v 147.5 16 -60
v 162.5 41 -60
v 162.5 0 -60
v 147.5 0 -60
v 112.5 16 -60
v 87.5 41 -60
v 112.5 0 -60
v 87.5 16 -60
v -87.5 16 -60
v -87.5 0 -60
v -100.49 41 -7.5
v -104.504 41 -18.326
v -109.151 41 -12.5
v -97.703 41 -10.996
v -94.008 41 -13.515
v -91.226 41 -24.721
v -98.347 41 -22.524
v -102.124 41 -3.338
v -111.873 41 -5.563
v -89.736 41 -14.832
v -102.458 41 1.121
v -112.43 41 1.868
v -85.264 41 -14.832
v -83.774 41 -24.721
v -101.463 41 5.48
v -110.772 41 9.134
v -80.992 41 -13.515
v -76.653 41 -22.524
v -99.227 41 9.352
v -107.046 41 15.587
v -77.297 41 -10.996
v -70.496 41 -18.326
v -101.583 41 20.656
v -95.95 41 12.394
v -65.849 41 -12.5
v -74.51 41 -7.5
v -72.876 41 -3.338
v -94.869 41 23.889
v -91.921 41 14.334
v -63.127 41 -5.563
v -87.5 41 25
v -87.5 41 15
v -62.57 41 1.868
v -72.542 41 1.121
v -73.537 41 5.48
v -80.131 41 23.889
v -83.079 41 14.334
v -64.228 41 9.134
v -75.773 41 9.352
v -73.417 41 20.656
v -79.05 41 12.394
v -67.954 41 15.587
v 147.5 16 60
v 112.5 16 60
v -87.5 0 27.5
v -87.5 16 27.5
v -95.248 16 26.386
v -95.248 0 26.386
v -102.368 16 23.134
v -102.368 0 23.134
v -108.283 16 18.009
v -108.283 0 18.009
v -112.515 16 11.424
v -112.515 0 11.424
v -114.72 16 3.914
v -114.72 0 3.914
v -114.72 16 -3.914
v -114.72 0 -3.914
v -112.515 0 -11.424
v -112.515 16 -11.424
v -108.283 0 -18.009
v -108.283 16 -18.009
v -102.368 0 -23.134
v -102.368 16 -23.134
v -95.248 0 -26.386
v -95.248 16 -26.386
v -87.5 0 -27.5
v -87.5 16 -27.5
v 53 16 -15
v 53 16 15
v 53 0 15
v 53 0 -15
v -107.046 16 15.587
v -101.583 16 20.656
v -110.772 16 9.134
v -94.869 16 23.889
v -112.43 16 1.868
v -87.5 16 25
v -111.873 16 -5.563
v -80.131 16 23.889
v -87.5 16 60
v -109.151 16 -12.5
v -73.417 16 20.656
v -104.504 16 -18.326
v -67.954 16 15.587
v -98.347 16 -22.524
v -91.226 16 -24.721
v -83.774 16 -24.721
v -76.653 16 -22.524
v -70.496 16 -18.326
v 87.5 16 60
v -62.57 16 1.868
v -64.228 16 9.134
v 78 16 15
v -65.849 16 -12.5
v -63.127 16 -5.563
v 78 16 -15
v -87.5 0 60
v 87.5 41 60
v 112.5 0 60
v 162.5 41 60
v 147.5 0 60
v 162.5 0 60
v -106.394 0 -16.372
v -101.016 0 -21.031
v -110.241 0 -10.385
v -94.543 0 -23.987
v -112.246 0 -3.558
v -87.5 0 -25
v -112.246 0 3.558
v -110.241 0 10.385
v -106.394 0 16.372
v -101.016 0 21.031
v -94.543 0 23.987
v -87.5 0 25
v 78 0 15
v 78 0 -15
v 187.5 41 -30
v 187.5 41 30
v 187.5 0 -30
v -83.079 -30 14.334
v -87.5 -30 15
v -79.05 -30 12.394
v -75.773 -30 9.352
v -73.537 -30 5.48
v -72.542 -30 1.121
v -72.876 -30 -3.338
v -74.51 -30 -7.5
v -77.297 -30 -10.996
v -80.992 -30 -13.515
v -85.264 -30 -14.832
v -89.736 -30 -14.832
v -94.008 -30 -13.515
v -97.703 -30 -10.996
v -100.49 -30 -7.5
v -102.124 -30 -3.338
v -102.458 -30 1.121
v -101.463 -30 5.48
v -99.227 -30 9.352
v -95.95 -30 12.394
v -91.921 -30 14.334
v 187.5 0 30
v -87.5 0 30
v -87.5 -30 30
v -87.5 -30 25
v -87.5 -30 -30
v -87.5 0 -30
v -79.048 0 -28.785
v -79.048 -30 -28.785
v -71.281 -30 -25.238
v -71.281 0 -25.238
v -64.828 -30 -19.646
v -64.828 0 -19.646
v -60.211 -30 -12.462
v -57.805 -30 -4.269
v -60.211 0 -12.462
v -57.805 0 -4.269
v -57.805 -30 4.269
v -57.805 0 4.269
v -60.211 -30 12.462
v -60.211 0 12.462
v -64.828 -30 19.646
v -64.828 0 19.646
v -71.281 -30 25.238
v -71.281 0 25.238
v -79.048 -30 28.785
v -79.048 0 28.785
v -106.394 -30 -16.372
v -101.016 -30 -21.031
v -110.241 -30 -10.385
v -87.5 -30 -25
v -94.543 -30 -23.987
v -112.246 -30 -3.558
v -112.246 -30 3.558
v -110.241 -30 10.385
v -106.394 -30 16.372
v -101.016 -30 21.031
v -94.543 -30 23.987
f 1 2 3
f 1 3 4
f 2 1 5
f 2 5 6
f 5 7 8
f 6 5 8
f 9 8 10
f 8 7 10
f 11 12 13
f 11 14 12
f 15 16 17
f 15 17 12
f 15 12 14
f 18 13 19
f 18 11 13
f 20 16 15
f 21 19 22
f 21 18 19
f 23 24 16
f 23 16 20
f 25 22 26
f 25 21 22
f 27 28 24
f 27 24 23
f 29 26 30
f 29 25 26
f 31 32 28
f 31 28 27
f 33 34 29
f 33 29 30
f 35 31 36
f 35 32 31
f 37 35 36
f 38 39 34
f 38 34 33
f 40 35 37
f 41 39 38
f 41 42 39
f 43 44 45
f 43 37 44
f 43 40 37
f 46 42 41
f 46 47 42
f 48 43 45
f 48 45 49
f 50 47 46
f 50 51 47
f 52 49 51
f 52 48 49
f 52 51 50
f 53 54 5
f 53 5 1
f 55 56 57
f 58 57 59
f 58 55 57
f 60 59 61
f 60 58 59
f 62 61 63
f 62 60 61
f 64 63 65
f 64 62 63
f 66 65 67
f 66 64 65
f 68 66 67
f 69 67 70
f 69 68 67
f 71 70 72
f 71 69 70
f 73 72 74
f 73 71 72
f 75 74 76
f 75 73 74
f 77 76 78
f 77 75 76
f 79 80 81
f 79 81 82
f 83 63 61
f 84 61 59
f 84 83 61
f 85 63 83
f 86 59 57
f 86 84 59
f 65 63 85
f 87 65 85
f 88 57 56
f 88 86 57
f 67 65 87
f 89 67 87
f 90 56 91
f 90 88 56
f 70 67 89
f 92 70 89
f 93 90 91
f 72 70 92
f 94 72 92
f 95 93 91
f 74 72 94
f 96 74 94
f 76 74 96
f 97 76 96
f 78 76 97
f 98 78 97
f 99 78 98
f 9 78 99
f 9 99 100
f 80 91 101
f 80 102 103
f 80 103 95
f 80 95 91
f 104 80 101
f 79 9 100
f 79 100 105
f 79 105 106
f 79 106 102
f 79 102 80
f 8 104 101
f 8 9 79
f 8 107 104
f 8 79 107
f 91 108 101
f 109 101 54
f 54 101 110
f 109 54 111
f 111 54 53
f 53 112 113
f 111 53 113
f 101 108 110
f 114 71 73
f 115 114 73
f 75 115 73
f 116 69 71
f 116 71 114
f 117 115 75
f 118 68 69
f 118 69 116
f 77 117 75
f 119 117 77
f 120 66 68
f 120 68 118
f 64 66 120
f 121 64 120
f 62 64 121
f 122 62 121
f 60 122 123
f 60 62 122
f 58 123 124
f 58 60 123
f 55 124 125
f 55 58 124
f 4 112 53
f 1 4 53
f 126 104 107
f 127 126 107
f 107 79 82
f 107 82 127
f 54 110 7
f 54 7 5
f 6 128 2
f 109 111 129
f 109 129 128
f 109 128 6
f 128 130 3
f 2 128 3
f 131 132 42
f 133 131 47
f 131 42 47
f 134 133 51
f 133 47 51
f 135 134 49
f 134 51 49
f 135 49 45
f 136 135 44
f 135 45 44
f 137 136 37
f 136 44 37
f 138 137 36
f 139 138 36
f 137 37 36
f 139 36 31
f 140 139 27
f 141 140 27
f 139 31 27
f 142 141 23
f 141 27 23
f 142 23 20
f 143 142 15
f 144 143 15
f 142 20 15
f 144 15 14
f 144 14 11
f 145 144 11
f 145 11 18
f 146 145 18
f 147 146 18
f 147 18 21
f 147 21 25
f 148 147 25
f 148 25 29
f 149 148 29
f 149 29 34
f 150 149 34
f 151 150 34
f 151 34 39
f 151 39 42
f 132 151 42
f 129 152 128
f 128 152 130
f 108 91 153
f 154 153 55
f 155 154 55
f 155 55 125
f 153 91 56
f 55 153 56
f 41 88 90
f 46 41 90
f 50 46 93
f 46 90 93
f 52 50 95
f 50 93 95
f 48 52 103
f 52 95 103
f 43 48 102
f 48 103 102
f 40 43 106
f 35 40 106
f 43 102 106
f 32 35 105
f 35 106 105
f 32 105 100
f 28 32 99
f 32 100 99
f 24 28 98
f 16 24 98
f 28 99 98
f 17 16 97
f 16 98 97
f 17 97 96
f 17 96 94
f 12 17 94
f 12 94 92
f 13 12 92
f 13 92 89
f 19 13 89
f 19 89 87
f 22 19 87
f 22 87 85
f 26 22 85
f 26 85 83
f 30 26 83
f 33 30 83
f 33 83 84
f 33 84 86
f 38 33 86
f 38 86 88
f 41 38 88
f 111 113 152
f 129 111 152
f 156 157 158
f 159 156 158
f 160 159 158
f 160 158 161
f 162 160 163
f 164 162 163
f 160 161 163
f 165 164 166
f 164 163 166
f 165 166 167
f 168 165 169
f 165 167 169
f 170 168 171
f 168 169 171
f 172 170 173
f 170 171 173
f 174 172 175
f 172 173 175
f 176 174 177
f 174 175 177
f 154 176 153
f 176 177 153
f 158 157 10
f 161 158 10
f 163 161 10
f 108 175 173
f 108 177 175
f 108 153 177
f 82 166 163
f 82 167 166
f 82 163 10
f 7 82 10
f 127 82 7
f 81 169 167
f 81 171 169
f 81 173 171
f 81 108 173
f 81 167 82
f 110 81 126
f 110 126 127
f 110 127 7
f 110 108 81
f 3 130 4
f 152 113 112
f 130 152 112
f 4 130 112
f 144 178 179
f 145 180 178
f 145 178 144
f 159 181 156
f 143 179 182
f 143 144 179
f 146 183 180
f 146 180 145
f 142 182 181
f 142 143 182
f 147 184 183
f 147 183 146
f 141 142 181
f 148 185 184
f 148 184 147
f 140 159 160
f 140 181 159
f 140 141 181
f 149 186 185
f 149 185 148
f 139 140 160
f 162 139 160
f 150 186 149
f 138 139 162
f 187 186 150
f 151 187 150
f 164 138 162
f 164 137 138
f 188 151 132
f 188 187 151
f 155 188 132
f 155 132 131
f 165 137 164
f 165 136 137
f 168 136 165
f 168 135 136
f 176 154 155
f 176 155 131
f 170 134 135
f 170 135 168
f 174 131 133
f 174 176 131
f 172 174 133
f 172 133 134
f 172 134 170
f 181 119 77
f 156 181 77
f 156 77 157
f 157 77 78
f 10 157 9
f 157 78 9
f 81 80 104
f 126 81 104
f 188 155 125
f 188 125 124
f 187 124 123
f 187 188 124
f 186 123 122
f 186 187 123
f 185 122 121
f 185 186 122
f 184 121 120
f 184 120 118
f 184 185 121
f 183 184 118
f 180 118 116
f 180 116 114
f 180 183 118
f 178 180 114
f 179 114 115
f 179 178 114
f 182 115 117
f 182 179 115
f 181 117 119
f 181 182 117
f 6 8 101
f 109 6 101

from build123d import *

# Parameters (mm, degrees)
CROQUIS1_W              = 175
CROQUIS1_H              = 120
SALIENTE_EXTRUIR1_DEPTH = 16
SALIENTE_EXTRUIR3_DEPTH = 41
CROQUIS7_W              = 35
CROQUIS7_H              = 16
CORTAR_EXTRUIR1_DEPTH   = 227.356466663
CROQUIS11_W             = 25
CROQUIS11_H             = 30
CORTAR_EXTRUIR2_DEPTH   = 199.447096225
CROQUIS12_R             = 25
SALIENTE_EXTRUIR4_DEPTH = 25
CROQUIS14_R             = 27.5
SALIENTE_EXTRUIR7_DEPTH = 16
SALIENTE_EXTRUIR8_START = 30
SALIENTE_EXTRUIR8_DEPTH = 30
SALIENTE_EXTRUIR9_DEPTH = 30
CROQUIS17_R             = 15
CORTAR_EXTRUIR3_DEPTH   = 210.277925257


with BuildPart() as part:
    # Croquis1 → Saliente-Extruir1 (new body)
    with BuildSketch(Plane(origin=(0, 0, 0), x_dir=(1, 0, 0), z_dir=(0, 1, 0))):
        Rectangle(CROQUIS1_W, CROQUIS1_H)
    extrude(amount=SALIENTE_EXTRUIR1_DEPTH)

    # Croquis6 → Saliente-Extruir3 (add)
    with BuildSketch(Plane.XZ):
        Polygon((87.5, 60), (162.5, 60), (187.5, 30), (187.5, -30), (162.5, -60), (87.5, -60), align=None)
    extrude(amount=-SALIENTE_EXTRUIR3_DEPTH)

    # Croquis7 → Cortar-Extruir1 (cut, through all)
    with BuildSketch(Plane.XY.offset(60)):
        with Locations((130, 8)):
            Rectangle(CROQUIS7_W, CROQUIS7_H)
    extrude(amount=-CORTAR_EXTRUIR1_DEPTH, mode=Mode.SUBTRACT)

    # Croquis11 → Cortar-Extruir2 (cut, through all)
    with BuildSketch(Plane(origin=(0, 16, 0), x_dir=(1, 0, 0), z_dir=(0, 1, 0))):
        with Locations((65.5, 0)):
            Rectangle(CROQUIS11_W, CROQUIS11_H)
    extrude(amount=-CORTAR_EXTRUIR2_DEPTH, mode=Mode.SUBTRACT)

    # Croquis12 → Saliente-Extruir4 (add)
    with BuildSketch(Plane(origin=(0, 16, 0), x_dir=(1, 0, 0), z_dir=(0, 1, 0))):
        with Locations(Location((-87.5, 0, 0), (0, 0, 270))):
            Circle(CROQUIS12_R)
    extrude(amount=SALIENTE_EXTRUIR4_DEPTH)

    # Croquis14 → Saliente-Extruir7 (add)
    with BuildSketch(Plane.XZ):
        with Locations((-87.5, 0)):
            Circle(CROQUIS14_R)
    extrude(amount=-SALIENTE_EXTRUIR7_DEPTH)

    # Croquis15 → Saliente-Extruir8 (add)
    with BuildSketch(Plane(origin=(0, 0, 0), x_dir=(-1, 0, 0), z_dir=(0, -1, 0)).offset(SALIENTE_EXTRUIR8_START)):
        with BuildLine():
            Line((87.5, 25), (87.5, -25))
            ThreePointArc((87.5, -25), (112.5, 0), (87.5, 25))
        make_face()
    extrude(amount=-SALIENTE_EXTRUIR8_DEPTH)

    # Croquis16 → Saliente-Extruir9 (add)
    with BuildSketch(Plane.XZ):
        with BuildLine():
            Line((-87.5, 30), (-87.5, -30))
            ThreePointArc((-87.5, -30), (-57.5, 0), (-87.5, 30))
        make_face()
    extrude(amount=SALIENTE_EXTRUIR9_DEPTH)

    # Croquis17 → Cortar-Extruir3 (cut, through all)
    with BuildSketch(Plane(origin=(0, 41, 0), x_dir=(1, 0, 0), z_dir=(0, 1, 0))):
        with Locations(Location((-87.5, 0, 0), (0, 0, 270))):
            Circle(CROQUIS17_R)
    extrude(amount=-CORTAR_EXTRUIR3_DEPTH, mode=Mode.SUBTRACT)


solid = part.part
